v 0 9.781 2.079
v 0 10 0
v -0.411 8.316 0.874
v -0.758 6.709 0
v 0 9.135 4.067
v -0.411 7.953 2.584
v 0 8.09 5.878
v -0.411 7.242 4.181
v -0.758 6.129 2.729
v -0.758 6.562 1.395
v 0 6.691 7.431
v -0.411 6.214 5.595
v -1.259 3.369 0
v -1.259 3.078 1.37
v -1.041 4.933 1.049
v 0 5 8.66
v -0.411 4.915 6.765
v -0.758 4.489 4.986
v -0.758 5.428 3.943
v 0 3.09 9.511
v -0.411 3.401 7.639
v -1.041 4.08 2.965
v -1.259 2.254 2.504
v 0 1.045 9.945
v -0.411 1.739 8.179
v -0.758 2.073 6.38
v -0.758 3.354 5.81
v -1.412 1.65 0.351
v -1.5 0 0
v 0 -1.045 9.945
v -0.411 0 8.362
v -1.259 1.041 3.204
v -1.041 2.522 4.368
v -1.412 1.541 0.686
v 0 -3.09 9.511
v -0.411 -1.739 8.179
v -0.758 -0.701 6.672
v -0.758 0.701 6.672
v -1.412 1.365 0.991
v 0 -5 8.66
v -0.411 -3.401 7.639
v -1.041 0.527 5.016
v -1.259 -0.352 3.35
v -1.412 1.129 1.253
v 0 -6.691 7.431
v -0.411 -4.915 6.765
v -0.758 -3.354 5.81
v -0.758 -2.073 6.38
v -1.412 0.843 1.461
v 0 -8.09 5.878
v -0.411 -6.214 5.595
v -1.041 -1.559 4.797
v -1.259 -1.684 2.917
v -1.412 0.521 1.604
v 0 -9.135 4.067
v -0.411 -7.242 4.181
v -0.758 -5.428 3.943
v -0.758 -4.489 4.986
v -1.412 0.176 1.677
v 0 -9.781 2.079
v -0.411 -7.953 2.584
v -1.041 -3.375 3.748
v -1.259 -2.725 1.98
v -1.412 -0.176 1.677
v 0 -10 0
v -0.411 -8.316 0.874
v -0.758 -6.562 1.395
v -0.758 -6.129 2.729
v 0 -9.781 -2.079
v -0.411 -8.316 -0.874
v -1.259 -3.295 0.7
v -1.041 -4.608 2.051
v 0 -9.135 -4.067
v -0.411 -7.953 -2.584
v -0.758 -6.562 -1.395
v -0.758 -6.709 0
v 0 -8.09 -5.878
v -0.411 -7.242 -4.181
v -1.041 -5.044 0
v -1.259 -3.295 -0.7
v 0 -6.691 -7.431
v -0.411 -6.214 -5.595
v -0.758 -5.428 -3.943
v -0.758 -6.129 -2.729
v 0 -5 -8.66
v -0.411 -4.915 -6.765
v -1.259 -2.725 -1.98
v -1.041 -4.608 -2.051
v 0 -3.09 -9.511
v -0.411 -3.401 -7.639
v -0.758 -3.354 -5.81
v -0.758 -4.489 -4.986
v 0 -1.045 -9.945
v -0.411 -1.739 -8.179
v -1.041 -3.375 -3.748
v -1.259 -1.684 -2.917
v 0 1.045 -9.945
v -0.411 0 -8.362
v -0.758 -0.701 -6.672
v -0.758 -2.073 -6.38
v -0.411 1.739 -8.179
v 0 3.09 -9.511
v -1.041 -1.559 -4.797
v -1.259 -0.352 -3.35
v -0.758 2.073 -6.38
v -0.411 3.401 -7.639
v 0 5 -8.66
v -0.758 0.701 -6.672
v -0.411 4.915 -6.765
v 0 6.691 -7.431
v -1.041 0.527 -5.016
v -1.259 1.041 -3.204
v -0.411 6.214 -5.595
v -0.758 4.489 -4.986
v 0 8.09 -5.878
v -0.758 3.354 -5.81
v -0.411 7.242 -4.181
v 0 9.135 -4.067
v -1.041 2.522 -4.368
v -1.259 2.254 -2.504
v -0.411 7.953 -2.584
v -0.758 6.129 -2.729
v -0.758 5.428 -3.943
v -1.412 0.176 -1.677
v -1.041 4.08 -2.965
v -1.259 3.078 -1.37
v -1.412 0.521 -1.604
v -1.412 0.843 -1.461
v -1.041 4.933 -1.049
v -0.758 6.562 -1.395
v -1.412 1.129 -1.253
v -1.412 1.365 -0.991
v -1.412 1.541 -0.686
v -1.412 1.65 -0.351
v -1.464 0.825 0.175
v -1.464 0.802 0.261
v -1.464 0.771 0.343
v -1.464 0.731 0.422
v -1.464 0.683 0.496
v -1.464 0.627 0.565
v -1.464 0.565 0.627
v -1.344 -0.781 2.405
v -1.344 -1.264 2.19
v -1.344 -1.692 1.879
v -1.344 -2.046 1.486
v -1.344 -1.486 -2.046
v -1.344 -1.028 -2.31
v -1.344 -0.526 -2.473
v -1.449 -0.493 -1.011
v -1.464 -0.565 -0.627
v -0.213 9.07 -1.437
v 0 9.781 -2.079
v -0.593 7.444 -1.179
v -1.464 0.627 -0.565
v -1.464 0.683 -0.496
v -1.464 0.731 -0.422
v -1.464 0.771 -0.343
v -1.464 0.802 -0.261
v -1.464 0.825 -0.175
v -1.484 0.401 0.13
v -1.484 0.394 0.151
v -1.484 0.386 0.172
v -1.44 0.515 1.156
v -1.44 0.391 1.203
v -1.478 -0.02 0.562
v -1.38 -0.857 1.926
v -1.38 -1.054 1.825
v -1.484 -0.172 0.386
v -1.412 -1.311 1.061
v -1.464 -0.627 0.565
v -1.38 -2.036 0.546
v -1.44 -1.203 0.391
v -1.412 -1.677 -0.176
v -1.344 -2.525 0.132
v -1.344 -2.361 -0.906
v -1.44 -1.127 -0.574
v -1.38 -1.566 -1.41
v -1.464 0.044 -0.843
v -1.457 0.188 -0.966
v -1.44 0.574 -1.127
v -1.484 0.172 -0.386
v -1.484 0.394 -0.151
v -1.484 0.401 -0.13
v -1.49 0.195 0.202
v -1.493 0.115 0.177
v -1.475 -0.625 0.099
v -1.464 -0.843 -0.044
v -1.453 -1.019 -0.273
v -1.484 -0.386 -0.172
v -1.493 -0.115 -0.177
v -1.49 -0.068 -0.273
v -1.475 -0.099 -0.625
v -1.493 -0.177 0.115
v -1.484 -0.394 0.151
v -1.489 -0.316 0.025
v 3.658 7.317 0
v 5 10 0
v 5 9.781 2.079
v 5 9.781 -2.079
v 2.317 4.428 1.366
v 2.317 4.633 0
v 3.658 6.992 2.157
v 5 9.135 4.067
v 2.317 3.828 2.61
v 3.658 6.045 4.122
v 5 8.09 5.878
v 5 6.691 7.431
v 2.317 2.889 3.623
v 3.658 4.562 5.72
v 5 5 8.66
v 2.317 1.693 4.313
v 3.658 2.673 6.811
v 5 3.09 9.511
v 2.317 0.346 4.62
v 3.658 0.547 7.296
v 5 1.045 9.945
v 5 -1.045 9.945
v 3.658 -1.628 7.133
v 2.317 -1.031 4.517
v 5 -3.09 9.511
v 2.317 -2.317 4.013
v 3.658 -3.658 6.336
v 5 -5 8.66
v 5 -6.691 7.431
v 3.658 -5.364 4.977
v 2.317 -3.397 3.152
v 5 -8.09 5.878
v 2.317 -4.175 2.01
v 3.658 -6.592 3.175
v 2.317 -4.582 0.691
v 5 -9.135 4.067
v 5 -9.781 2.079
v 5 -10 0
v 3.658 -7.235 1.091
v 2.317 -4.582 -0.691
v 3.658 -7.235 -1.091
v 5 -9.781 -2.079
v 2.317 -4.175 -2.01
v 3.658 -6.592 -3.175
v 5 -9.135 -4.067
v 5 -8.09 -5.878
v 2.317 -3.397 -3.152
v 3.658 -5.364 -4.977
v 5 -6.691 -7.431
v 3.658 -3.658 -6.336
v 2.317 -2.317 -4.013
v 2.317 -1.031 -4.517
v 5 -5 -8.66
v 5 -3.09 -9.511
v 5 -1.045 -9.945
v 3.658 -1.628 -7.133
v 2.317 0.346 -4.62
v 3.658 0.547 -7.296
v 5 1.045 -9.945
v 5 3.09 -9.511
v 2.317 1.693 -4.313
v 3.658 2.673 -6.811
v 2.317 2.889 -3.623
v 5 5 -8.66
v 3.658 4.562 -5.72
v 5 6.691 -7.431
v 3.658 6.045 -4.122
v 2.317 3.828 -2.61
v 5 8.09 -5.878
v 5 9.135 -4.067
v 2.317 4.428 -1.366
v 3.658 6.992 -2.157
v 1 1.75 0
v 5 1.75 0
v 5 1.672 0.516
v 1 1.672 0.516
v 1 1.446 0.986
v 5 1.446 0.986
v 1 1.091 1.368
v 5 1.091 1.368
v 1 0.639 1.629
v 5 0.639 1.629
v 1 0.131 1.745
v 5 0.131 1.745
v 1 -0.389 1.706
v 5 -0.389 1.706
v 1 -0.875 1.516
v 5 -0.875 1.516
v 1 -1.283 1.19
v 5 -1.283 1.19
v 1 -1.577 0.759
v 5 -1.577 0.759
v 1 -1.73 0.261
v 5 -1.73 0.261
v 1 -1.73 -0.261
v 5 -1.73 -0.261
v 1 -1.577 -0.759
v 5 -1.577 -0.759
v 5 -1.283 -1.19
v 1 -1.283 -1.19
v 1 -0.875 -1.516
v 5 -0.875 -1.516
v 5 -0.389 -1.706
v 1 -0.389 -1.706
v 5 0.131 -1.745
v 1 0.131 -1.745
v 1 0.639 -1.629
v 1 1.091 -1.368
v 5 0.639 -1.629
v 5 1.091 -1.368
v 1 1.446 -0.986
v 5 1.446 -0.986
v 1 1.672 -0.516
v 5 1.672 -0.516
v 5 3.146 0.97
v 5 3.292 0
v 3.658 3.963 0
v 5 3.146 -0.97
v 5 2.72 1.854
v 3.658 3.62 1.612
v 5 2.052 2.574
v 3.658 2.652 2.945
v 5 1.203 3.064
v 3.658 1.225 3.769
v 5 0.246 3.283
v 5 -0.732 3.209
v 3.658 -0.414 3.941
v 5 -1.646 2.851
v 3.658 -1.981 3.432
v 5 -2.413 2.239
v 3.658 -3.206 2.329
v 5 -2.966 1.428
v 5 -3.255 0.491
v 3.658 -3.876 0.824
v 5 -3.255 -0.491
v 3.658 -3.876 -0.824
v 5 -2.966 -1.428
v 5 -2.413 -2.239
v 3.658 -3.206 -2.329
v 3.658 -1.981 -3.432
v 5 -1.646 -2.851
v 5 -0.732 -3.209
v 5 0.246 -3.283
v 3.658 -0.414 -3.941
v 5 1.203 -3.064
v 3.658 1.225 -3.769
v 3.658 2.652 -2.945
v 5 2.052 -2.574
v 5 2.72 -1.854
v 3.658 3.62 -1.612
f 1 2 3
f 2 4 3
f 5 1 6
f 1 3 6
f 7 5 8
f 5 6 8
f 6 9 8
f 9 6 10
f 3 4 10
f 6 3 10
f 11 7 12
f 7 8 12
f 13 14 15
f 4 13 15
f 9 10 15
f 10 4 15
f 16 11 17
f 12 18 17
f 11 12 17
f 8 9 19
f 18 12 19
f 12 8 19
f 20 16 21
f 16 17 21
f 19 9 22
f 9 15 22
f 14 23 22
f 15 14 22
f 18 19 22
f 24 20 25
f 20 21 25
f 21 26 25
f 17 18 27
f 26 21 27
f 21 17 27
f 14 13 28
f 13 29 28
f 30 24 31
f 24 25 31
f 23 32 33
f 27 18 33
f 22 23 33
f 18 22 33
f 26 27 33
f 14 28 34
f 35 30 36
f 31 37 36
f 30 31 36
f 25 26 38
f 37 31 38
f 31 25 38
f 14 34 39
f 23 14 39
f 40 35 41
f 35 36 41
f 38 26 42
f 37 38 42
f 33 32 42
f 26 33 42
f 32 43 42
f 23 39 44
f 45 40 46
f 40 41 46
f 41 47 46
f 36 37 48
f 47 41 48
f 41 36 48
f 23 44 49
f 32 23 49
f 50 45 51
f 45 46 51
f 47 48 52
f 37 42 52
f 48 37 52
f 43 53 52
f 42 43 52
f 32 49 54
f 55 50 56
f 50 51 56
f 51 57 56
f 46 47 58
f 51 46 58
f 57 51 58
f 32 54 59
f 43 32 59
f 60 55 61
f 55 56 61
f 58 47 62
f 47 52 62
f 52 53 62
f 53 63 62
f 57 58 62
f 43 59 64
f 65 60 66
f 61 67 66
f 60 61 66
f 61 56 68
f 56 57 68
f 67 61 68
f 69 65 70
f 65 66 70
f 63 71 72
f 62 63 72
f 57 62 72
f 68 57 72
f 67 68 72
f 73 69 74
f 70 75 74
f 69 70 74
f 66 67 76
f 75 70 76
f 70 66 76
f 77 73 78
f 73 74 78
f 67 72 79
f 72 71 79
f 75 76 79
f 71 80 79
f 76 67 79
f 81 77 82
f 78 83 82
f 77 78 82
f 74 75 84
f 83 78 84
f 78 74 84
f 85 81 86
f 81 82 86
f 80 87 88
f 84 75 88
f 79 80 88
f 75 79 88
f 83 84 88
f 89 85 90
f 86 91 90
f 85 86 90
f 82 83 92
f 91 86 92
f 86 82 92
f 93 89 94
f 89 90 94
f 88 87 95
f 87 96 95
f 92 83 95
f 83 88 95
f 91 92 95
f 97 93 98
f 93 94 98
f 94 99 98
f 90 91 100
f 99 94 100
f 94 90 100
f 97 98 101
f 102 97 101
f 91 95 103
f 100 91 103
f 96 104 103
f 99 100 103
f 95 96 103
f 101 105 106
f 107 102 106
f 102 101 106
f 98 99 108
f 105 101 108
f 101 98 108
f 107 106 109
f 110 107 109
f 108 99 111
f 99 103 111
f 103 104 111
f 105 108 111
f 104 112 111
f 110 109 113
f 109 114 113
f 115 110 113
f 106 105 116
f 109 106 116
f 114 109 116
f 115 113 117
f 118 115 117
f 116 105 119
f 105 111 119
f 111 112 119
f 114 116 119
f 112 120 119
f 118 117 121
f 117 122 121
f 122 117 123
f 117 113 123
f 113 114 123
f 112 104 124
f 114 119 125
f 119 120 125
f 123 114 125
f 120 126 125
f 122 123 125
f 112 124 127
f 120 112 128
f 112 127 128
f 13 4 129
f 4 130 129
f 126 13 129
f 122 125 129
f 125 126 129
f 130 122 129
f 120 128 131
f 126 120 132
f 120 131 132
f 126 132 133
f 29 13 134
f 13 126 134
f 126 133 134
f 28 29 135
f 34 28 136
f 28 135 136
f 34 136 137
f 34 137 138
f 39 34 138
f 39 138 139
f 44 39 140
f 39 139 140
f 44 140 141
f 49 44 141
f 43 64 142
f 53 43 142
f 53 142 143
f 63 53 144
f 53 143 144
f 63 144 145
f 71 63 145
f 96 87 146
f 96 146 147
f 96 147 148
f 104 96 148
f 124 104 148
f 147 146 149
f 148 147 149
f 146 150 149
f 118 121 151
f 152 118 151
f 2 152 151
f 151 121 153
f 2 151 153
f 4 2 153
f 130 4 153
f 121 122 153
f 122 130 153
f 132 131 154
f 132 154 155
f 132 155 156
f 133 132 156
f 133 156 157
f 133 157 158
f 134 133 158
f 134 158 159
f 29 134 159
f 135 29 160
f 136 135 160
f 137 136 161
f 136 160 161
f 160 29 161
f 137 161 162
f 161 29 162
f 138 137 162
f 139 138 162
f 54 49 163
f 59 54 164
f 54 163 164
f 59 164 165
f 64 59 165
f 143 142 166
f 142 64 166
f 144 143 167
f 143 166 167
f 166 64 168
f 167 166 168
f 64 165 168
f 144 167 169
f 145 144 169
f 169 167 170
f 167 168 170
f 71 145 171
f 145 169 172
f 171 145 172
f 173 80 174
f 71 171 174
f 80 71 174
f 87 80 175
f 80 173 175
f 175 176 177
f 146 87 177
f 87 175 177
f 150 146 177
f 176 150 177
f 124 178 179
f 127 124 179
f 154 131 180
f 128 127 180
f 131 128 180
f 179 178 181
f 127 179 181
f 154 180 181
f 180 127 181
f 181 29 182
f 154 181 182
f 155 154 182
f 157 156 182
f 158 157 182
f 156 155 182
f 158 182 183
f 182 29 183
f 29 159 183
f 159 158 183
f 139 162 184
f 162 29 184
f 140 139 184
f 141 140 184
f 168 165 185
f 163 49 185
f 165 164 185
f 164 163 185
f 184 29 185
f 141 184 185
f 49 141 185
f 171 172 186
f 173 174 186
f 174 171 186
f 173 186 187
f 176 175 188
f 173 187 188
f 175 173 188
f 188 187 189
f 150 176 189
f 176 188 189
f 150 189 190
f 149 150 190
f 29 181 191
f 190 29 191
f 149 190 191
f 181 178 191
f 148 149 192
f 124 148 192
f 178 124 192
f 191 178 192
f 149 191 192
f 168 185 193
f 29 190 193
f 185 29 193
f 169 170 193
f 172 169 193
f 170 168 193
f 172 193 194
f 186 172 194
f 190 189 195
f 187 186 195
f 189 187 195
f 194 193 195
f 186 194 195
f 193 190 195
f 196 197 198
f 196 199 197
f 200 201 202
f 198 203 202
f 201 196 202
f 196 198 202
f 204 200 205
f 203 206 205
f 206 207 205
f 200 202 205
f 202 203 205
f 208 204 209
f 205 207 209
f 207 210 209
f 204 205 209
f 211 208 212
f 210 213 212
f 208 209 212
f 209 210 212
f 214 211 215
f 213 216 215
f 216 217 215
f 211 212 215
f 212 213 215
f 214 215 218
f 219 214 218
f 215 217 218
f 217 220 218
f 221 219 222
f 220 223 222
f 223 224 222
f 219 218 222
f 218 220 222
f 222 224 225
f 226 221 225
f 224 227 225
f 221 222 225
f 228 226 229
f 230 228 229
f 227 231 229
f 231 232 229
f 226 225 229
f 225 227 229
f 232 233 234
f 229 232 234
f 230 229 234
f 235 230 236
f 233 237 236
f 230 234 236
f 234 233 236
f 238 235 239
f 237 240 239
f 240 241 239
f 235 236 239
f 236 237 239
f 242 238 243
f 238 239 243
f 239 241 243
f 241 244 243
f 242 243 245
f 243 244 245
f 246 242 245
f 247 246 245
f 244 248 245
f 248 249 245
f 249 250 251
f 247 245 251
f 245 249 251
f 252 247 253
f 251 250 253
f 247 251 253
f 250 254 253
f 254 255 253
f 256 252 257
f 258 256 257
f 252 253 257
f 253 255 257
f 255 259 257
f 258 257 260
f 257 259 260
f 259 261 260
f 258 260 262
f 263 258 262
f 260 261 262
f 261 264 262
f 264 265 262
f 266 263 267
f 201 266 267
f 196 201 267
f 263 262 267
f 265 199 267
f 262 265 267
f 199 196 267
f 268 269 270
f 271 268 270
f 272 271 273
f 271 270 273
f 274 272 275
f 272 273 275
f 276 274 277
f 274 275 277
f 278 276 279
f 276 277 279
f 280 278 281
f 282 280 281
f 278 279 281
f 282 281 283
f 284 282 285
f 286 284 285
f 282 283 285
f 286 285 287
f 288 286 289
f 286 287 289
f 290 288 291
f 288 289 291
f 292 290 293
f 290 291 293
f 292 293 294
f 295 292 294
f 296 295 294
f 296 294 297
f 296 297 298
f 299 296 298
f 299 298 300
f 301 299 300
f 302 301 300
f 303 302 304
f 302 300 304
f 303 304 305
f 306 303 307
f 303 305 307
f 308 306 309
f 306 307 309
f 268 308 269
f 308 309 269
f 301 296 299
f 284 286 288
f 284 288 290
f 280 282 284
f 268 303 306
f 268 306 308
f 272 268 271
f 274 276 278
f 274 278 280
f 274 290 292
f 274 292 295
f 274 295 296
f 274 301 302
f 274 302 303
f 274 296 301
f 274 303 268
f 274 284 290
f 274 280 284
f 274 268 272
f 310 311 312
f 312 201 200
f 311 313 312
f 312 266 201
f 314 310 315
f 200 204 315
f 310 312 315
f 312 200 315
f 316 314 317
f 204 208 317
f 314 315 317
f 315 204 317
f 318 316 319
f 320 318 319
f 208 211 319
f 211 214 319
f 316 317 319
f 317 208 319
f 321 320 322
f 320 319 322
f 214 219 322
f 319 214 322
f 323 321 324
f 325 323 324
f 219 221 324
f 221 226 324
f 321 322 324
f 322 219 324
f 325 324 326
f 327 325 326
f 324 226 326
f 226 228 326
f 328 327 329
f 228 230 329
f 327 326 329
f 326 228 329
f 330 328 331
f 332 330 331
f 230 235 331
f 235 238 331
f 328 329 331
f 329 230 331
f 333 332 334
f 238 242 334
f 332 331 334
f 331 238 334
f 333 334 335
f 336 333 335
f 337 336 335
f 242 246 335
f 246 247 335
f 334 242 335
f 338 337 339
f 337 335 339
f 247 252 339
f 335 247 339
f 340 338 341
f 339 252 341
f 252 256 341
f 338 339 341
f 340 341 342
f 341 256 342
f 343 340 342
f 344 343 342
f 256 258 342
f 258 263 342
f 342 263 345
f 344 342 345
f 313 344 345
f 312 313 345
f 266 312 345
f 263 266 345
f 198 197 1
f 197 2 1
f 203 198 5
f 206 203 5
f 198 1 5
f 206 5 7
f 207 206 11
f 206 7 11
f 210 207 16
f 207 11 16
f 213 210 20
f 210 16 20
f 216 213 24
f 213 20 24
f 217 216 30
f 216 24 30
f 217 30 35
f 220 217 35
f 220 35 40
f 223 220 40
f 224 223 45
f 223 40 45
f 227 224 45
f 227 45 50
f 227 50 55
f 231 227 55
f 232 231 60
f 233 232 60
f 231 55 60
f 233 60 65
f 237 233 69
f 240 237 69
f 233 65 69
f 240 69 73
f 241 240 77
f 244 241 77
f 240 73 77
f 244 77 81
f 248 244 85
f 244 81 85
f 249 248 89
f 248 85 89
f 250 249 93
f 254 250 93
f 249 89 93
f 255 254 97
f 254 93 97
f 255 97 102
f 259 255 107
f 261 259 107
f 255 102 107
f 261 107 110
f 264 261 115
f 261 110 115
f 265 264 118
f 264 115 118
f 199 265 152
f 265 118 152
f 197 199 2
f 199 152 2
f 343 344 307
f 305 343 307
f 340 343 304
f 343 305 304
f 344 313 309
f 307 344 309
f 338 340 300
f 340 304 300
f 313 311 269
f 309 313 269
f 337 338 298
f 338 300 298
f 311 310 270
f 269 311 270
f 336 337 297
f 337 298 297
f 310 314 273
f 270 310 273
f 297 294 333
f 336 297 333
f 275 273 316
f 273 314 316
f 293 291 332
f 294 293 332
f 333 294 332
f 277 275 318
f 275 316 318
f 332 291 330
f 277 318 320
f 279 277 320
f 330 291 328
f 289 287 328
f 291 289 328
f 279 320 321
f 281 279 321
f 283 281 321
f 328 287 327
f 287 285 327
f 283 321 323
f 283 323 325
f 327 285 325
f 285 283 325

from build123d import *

# Parameters (mm, degrees)
F2_R     = 1.75
F3_DEPTH = 4


with BuildPart() as f1:
    # F0 (on Top) → F1 (revolve)
    with BuildSketch(Plane.XY):
        with BuildLine():
            Line((5, 10), (0, 10))
            ThreePointArc((0, 10), (-1.041182, 5.043677), (-1.5, 0))
            Line((-1.5, 0), (5, 0))
            Line((5, 0), (5, 3.291796))
            Line((5, 3.291796), (2.316718, 4.633437))
            Line((2.316718, 4.633437), (5, 10))
        make_face()
    revolve(axis=Axis((1.620585, 0, 0), (1, 0, 0)))

    # F2 (on face) → F3 (cut)
    with BuildSketch(Plane.YZ.offset(5)):
        Circle(F2_R)
    extrude(amount=-F3_DEPTH, mode=Mode.SUBTRACT)


solid = f1.part
